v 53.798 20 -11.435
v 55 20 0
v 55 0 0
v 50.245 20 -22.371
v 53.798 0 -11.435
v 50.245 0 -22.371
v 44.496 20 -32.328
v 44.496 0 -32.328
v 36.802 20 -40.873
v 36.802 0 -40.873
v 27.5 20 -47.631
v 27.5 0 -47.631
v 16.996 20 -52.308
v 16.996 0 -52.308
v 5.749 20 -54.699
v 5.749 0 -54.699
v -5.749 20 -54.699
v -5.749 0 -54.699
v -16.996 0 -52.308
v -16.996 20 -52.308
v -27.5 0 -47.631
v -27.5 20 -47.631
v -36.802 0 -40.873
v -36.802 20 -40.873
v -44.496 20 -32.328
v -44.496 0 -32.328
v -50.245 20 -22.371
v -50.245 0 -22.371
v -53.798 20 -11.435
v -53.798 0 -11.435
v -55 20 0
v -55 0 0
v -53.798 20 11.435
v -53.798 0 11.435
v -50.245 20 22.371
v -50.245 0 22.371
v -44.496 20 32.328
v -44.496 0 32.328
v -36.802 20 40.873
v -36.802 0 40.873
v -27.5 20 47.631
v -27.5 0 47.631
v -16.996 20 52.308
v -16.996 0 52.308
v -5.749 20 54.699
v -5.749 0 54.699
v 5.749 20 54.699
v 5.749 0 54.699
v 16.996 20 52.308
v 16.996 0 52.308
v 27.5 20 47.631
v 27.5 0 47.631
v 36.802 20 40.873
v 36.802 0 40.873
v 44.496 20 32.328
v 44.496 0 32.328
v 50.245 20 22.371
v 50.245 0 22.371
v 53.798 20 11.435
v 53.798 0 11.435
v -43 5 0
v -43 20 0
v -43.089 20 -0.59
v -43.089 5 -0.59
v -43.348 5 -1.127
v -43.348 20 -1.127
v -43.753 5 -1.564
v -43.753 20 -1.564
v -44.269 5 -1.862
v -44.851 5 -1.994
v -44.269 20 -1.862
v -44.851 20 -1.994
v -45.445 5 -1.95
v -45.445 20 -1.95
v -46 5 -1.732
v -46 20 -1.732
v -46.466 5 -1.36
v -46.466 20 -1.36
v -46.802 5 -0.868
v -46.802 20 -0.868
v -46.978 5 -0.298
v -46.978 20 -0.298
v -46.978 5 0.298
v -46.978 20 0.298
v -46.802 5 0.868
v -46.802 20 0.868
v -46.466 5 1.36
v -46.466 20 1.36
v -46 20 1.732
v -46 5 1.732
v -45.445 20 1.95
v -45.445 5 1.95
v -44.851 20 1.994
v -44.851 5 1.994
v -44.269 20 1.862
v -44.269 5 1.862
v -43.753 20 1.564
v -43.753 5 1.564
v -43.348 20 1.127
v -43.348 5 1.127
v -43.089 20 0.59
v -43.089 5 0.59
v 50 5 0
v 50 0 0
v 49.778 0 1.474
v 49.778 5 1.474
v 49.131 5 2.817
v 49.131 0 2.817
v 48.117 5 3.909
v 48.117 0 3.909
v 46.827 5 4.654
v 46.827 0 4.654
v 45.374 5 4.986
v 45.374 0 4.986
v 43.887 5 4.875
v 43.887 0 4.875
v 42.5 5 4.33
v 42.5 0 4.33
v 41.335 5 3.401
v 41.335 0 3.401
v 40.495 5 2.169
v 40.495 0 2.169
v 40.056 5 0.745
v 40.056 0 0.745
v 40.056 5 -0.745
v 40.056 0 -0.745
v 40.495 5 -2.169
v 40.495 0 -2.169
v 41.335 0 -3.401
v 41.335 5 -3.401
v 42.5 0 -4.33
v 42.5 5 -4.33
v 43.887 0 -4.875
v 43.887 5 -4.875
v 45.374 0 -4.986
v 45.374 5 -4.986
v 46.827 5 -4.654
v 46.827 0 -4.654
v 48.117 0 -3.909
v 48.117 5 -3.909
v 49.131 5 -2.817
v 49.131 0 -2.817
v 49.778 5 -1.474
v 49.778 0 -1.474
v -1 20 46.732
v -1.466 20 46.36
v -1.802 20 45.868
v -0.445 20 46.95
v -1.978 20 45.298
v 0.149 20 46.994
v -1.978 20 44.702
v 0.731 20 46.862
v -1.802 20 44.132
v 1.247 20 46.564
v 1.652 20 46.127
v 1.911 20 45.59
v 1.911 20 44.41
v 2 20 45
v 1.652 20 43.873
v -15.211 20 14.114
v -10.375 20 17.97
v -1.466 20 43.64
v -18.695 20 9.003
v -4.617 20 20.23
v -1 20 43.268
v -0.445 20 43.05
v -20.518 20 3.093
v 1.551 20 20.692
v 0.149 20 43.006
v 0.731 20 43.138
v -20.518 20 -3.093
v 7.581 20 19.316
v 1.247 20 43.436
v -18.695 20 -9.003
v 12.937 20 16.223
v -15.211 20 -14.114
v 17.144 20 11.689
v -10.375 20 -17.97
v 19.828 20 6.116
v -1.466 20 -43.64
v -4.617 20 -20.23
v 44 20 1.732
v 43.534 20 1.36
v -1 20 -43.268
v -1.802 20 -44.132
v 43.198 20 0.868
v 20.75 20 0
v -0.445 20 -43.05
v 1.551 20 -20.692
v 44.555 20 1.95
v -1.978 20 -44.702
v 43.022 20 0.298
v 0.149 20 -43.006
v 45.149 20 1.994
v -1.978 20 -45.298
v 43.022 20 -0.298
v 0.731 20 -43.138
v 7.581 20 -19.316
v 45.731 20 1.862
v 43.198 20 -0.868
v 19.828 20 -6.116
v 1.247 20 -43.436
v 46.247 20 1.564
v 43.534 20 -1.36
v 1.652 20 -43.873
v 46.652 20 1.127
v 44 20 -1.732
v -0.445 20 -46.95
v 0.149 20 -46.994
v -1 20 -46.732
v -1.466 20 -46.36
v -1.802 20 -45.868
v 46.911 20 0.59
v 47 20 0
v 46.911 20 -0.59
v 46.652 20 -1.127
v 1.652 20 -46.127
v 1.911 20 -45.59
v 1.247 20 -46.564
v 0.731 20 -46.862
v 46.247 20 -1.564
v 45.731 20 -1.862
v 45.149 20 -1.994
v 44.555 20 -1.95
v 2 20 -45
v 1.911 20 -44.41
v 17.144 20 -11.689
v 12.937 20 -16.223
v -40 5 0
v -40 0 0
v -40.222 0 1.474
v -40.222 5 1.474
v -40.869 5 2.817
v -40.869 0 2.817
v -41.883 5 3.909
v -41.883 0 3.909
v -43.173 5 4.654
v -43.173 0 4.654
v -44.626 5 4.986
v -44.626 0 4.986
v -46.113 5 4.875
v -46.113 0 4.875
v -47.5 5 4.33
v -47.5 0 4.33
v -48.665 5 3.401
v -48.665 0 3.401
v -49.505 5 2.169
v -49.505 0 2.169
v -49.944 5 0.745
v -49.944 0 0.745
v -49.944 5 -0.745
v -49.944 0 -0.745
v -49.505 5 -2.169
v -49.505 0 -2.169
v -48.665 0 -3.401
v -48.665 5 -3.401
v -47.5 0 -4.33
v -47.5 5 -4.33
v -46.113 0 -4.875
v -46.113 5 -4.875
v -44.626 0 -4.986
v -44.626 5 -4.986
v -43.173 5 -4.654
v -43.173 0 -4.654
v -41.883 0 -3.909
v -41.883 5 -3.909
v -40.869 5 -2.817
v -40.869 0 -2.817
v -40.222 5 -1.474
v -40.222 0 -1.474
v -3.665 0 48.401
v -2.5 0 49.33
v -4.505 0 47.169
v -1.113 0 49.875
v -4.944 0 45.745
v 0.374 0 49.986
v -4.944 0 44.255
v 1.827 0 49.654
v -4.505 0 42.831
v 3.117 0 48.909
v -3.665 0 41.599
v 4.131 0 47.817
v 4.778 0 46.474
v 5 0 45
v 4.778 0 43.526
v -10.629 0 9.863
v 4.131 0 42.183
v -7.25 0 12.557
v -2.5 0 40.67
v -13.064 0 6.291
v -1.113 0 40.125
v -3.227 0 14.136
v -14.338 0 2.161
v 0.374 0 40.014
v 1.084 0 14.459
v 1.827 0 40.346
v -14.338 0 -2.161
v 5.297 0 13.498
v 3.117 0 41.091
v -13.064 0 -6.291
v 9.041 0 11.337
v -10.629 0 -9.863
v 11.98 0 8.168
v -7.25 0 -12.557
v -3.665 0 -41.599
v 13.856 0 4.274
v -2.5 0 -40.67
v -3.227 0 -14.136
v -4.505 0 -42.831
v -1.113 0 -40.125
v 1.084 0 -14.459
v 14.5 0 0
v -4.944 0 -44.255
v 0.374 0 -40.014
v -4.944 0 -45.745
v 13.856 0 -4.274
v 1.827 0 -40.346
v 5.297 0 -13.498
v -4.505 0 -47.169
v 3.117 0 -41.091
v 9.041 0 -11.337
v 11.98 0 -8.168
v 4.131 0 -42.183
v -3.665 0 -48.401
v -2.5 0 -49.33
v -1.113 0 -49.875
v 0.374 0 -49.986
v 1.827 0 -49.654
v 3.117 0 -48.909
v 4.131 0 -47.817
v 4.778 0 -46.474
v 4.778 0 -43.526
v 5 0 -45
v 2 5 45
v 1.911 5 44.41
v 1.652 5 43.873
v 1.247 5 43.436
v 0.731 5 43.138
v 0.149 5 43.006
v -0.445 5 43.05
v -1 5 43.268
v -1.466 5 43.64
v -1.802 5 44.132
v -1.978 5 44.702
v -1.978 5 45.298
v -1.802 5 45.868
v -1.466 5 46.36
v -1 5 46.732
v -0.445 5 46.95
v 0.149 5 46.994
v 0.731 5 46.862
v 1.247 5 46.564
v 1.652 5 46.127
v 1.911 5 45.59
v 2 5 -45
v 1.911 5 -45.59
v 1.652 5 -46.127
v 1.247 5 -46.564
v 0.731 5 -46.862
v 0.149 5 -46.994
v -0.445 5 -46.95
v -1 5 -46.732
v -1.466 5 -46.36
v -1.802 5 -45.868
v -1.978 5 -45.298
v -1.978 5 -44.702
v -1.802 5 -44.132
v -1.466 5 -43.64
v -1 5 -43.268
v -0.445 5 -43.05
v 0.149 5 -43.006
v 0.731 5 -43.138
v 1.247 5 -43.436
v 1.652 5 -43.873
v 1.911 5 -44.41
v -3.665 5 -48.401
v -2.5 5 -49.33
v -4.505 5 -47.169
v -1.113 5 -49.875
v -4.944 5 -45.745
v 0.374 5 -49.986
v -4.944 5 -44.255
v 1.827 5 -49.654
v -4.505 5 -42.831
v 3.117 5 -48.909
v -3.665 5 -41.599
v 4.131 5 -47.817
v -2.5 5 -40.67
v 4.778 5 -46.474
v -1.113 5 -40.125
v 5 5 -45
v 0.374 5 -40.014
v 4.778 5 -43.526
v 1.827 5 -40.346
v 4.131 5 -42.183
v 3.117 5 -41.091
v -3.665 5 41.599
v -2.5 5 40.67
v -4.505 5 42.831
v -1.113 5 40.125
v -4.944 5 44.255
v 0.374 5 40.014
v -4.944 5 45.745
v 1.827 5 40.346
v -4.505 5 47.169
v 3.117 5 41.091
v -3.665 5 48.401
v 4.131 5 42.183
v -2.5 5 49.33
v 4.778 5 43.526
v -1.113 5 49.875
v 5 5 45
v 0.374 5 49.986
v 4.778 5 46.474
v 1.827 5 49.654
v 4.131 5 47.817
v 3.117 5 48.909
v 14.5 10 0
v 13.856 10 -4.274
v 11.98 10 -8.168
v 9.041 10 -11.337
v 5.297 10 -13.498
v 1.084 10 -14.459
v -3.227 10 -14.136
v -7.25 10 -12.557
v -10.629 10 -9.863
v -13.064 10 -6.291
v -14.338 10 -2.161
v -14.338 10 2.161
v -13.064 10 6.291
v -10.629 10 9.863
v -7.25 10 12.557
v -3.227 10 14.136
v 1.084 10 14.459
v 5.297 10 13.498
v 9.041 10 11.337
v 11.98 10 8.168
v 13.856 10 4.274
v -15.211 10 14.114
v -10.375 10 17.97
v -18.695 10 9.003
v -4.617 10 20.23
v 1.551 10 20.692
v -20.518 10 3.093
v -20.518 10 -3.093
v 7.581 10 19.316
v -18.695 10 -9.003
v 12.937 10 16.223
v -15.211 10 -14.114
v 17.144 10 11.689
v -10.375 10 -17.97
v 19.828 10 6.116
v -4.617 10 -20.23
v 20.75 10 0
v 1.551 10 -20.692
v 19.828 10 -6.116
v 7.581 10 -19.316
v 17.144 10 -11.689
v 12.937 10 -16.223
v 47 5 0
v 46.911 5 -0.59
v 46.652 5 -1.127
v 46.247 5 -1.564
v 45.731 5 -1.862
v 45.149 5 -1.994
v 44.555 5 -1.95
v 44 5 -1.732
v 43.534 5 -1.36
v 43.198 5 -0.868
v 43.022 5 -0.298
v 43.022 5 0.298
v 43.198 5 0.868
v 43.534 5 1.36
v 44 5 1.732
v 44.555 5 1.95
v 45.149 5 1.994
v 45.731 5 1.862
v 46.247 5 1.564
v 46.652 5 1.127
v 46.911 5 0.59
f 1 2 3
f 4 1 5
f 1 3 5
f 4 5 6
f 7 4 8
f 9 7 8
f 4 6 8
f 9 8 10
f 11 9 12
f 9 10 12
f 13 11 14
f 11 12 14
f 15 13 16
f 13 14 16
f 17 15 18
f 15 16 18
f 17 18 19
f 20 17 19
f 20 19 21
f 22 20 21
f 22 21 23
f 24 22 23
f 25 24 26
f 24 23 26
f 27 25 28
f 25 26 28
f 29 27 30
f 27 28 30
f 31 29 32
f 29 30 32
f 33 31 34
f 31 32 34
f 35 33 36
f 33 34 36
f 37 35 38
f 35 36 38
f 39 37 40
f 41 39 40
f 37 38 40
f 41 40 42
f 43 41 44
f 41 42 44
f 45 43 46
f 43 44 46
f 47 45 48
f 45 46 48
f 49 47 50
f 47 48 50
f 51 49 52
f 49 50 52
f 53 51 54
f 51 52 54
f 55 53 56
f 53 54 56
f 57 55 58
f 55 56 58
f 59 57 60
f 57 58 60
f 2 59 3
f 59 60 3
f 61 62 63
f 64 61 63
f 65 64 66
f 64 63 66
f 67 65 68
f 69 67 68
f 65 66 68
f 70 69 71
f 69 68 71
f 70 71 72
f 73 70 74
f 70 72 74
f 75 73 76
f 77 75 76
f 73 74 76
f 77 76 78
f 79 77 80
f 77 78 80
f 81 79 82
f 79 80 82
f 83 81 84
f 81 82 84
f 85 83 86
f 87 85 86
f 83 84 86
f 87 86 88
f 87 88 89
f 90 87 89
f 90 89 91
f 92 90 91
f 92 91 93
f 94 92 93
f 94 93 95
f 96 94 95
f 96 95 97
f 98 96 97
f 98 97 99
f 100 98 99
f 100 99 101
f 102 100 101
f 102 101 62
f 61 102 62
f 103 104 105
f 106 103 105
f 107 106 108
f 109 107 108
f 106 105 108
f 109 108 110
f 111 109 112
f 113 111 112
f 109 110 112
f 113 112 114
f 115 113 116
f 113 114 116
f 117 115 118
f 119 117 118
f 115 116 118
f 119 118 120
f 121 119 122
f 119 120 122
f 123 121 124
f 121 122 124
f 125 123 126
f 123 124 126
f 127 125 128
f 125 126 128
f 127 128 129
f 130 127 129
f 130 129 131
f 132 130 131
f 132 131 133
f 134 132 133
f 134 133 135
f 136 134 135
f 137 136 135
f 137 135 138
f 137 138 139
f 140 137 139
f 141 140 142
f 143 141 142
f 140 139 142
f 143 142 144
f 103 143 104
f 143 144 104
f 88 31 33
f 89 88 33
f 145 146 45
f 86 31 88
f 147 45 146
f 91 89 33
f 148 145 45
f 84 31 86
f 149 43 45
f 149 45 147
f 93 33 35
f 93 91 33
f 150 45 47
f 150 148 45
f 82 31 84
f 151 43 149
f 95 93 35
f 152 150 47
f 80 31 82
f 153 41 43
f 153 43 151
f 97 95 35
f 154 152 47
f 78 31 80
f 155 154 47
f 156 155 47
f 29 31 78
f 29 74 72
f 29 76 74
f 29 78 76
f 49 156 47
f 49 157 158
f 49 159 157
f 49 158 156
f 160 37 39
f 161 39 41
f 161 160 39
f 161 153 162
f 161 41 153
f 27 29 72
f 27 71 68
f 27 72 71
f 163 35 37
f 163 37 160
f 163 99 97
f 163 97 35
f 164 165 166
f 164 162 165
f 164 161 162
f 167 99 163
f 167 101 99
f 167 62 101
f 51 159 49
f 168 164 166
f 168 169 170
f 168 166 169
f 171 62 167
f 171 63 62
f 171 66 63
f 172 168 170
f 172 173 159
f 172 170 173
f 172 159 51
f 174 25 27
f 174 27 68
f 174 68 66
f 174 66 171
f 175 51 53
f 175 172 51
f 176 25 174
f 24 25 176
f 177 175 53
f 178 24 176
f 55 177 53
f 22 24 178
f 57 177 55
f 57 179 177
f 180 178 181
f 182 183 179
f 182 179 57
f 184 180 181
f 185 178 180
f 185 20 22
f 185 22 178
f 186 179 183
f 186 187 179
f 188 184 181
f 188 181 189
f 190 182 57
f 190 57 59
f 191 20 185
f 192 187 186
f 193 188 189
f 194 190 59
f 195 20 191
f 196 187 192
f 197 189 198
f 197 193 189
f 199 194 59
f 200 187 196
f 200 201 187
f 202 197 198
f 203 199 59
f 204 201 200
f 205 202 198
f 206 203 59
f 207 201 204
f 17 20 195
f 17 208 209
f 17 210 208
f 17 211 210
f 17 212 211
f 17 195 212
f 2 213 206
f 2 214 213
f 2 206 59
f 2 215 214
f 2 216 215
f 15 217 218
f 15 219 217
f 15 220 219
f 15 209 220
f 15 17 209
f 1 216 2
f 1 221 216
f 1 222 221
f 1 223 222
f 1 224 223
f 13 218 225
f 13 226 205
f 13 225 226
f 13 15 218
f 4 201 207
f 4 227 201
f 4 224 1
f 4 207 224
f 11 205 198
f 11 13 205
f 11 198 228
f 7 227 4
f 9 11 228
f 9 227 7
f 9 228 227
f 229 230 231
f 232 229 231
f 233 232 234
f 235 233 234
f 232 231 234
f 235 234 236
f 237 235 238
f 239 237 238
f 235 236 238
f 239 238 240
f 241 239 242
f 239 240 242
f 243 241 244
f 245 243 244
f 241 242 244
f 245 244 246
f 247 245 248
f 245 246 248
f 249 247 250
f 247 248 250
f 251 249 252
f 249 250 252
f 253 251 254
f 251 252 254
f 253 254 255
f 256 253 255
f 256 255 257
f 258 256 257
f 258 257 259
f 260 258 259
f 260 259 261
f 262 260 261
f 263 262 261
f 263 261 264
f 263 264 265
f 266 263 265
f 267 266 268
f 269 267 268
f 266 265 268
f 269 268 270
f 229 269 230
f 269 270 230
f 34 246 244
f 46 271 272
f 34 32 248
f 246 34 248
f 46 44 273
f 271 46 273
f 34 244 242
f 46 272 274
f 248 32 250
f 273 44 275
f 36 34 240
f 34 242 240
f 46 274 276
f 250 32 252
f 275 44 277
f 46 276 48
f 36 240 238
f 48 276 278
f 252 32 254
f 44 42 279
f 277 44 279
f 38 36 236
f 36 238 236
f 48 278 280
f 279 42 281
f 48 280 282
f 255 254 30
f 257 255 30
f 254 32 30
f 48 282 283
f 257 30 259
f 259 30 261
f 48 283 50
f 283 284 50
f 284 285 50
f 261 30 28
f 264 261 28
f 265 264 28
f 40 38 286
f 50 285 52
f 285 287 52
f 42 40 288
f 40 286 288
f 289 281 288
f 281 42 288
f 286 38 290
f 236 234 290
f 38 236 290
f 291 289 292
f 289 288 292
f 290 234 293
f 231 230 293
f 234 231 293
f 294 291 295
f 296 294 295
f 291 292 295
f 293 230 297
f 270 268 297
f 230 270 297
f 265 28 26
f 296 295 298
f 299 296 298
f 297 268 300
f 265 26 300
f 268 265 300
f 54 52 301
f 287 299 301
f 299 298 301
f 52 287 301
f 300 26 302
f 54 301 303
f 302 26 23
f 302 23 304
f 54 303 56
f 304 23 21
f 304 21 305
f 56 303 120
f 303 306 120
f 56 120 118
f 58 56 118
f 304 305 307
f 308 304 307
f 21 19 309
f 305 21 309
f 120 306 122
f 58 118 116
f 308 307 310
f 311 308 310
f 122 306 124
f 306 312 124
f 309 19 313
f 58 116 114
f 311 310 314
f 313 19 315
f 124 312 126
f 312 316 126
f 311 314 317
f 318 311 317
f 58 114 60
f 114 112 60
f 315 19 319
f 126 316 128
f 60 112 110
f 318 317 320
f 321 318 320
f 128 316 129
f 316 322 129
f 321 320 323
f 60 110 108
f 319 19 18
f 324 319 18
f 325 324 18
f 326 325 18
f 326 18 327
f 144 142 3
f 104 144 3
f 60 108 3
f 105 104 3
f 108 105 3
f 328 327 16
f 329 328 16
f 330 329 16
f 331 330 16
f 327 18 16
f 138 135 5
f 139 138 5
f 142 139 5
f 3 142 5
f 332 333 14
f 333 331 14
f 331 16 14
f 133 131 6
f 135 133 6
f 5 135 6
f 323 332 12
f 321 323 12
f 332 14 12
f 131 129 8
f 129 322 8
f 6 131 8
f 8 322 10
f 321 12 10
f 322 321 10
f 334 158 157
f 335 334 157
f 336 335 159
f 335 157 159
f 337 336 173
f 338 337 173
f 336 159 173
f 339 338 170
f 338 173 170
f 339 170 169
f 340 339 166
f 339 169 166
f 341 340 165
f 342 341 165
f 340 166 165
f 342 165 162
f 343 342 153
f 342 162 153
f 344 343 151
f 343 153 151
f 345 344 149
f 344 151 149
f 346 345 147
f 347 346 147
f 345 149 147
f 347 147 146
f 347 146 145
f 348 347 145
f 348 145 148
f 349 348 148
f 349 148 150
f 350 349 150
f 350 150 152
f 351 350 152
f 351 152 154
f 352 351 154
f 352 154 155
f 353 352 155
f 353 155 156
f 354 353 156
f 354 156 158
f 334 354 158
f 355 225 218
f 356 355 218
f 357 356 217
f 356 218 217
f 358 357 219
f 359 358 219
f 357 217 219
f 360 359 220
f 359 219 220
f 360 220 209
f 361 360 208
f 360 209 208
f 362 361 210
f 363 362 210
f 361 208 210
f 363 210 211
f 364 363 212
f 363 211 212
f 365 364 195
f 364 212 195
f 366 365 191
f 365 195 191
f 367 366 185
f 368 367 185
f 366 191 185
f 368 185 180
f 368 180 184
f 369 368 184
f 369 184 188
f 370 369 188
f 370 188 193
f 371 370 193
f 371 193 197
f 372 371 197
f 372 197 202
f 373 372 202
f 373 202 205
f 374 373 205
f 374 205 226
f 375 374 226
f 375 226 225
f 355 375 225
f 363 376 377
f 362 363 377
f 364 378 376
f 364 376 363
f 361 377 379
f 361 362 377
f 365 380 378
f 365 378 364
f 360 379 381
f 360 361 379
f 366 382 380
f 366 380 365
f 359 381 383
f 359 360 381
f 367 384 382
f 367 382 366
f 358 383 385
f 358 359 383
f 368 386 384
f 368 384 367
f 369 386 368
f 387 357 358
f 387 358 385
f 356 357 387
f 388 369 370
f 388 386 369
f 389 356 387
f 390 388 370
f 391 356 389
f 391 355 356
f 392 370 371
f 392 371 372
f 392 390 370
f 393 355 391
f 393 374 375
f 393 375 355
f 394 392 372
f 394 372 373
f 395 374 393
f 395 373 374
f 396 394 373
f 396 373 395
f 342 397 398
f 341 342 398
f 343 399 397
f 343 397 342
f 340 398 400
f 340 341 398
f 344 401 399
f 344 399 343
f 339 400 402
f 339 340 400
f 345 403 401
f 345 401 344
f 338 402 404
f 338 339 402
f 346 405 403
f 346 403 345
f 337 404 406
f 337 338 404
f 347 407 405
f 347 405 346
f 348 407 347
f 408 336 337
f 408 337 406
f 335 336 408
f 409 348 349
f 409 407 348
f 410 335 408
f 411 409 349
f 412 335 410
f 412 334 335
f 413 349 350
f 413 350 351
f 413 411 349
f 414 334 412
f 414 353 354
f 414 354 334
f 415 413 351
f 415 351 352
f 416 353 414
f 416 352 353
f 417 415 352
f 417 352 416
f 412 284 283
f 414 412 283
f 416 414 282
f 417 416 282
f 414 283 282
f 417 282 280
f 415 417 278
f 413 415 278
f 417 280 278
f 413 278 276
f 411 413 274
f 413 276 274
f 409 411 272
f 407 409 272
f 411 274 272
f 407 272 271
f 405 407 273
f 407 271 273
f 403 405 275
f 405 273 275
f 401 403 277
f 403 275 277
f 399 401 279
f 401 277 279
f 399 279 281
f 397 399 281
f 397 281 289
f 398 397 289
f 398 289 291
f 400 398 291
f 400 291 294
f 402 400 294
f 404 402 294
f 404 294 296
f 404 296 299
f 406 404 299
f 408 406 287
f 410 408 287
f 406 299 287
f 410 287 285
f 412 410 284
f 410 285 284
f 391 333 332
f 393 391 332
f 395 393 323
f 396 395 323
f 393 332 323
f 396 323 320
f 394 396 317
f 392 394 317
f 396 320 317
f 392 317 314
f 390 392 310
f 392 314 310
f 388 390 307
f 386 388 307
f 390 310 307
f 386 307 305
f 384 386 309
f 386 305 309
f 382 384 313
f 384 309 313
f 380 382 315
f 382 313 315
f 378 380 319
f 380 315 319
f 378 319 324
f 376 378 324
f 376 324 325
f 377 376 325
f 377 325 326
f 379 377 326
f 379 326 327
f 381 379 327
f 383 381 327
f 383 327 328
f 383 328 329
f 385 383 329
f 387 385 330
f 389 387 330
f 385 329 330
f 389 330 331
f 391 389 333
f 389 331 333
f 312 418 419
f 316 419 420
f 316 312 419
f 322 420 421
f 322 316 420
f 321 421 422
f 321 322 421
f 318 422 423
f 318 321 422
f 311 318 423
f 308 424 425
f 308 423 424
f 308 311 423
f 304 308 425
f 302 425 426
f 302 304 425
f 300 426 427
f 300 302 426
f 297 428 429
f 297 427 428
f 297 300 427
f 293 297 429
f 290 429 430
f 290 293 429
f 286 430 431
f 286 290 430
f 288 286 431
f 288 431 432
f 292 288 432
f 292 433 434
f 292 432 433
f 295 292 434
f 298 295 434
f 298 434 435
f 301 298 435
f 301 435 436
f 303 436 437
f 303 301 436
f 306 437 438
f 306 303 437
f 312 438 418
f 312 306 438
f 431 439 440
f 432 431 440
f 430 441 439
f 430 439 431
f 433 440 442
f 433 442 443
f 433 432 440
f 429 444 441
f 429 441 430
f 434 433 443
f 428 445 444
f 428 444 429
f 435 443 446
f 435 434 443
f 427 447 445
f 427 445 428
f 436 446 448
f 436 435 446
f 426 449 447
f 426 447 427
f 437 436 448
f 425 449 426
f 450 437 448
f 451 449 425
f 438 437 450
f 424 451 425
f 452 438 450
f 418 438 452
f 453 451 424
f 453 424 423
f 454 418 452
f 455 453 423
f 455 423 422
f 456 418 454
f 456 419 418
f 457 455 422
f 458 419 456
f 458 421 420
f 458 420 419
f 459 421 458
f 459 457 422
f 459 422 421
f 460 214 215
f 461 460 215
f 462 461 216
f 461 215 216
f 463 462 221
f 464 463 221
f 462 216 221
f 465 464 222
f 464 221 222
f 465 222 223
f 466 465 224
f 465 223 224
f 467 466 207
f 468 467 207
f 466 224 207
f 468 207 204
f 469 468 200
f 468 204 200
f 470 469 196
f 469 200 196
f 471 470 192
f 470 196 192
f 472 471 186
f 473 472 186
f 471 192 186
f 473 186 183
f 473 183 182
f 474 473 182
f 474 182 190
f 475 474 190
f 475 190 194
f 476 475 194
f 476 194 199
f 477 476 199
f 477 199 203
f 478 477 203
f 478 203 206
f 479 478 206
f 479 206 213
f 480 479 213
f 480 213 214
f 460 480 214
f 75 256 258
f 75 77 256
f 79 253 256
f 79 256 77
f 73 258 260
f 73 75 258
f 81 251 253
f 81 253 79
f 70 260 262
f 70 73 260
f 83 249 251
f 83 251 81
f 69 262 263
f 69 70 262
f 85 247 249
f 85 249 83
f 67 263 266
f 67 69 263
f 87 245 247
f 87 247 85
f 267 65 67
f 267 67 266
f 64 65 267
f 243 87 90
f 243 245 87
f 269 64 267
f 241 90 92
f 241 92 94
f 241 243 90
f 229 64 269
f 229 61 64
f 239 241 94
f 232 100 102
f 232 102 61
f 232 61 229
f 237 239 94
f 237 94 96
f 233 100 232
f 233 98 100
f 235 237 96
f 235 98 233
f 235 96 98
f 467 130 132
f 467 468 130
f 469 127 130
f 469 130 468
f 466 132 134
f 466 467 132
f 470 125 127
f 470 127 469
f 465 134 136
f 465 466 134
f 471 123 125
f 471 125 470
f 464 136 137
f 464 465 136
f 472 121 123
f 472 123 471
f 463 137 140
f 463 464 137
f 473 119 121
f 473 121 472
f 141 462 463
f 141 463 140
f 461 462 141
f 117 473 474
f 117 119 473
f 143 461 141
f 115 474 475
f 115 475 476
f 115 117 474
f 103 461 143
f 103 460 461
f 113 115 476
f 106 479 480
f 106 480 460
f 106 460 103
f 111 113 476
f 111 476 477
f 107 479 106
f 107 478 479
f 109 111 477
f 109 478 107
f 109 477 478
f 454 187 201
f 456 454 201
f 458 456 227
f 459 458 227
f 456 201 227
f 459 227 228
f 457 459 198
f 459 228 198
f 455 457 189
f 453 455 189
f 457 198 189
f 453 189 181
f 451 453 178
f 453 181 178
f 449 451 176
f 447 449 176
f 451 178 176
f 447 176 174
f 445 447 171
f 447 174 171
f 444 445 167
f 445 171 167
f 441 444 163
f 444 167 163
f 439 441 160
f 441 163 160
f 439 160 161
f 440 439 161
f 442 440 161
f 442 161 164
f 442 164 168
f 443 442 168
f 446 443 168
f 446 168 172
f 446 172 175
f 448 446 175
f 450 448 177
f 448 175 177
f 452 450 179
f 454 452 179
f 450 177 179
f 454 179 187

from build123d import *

# Parameters (mm, degrees)
SKETCH1_R           = 55
SKETCH1_R_2         = 14.5
BOSS_EXTRUDE1_DEPTH = 20
SKETCH2_R           = 20.75
CUT_EXTRUDE1_DEPTH  = 10
SKETCH4_R           = 2
CUT_EXTRUDE2_DEPTH  = 20
SKETCH6_R           = 5
CUT_EXTRUDE3_DEPTH  = 5


with BuildPart() as part:
    # Sketch1 → Boss-Extrude1 (new body)
    with BuildSketch(Plane(origin=(0, 0, 0), x_dir=(1, 0, 0), z_dir=(0, 1, 0))):
        Circle(SKETCH1_R)
        Circle(SKETCH1_R_2, mode=Mode.SUBTRACT)
    extrude(amount=BOSS_EXTRUDE1_DEPTH)

    # Sketch2 → Cut-Extrude1 (cut)
    with BuildSketch(Plane(origin=(0, 20, 0), x_dir=(1, 0, 0), z_dir=(0, 1, 0))):
        Circle(SKETCH2_R)
    extrude(amount=-CUT_EXTRUDE1_DEPTH, mode=Mode.SUBTRACT)

    # Sketch4 → Cut-Extrude2 (cut)
    with BuildSketch(Plane(origin=(0, 20, 0), x_dir=(1, 0, 0), z_dir=(0, 1, 0))):
        with Locations((0, 45)):
            Circle(SKETCH4_R)
        with Locations((45, 0)):
            Circle(SKETCH4_R)
        with Locations((0, -45)):
            Circle(SKETCH4_R)
        with Locations((-45, 0)):
            Circle(SKETCH4_R)
    extrude(amount=-CUT_EXTRUDE2_DEPTH, mode=Mode.SUBTRACT)

    # Sketch6 → Cut-Extrude3 (cut)
    with BuildSketch(Plane.XZ):
        with Locations((0, 45)):
            Circle(SKETCH6_R)
        with Locations((45, 0)):
            Circle(SKETCH6_R)
        with Locations((0, -45)):
            Circle(SKETCH6_R)
        with Locations((-45, 0)):
            Circle(SKETCH6_R)
    extrude(amount=-CUT_EXTRUDE3_DEPTH, mode=Mode.SUBTRACT)


solid = part.part
